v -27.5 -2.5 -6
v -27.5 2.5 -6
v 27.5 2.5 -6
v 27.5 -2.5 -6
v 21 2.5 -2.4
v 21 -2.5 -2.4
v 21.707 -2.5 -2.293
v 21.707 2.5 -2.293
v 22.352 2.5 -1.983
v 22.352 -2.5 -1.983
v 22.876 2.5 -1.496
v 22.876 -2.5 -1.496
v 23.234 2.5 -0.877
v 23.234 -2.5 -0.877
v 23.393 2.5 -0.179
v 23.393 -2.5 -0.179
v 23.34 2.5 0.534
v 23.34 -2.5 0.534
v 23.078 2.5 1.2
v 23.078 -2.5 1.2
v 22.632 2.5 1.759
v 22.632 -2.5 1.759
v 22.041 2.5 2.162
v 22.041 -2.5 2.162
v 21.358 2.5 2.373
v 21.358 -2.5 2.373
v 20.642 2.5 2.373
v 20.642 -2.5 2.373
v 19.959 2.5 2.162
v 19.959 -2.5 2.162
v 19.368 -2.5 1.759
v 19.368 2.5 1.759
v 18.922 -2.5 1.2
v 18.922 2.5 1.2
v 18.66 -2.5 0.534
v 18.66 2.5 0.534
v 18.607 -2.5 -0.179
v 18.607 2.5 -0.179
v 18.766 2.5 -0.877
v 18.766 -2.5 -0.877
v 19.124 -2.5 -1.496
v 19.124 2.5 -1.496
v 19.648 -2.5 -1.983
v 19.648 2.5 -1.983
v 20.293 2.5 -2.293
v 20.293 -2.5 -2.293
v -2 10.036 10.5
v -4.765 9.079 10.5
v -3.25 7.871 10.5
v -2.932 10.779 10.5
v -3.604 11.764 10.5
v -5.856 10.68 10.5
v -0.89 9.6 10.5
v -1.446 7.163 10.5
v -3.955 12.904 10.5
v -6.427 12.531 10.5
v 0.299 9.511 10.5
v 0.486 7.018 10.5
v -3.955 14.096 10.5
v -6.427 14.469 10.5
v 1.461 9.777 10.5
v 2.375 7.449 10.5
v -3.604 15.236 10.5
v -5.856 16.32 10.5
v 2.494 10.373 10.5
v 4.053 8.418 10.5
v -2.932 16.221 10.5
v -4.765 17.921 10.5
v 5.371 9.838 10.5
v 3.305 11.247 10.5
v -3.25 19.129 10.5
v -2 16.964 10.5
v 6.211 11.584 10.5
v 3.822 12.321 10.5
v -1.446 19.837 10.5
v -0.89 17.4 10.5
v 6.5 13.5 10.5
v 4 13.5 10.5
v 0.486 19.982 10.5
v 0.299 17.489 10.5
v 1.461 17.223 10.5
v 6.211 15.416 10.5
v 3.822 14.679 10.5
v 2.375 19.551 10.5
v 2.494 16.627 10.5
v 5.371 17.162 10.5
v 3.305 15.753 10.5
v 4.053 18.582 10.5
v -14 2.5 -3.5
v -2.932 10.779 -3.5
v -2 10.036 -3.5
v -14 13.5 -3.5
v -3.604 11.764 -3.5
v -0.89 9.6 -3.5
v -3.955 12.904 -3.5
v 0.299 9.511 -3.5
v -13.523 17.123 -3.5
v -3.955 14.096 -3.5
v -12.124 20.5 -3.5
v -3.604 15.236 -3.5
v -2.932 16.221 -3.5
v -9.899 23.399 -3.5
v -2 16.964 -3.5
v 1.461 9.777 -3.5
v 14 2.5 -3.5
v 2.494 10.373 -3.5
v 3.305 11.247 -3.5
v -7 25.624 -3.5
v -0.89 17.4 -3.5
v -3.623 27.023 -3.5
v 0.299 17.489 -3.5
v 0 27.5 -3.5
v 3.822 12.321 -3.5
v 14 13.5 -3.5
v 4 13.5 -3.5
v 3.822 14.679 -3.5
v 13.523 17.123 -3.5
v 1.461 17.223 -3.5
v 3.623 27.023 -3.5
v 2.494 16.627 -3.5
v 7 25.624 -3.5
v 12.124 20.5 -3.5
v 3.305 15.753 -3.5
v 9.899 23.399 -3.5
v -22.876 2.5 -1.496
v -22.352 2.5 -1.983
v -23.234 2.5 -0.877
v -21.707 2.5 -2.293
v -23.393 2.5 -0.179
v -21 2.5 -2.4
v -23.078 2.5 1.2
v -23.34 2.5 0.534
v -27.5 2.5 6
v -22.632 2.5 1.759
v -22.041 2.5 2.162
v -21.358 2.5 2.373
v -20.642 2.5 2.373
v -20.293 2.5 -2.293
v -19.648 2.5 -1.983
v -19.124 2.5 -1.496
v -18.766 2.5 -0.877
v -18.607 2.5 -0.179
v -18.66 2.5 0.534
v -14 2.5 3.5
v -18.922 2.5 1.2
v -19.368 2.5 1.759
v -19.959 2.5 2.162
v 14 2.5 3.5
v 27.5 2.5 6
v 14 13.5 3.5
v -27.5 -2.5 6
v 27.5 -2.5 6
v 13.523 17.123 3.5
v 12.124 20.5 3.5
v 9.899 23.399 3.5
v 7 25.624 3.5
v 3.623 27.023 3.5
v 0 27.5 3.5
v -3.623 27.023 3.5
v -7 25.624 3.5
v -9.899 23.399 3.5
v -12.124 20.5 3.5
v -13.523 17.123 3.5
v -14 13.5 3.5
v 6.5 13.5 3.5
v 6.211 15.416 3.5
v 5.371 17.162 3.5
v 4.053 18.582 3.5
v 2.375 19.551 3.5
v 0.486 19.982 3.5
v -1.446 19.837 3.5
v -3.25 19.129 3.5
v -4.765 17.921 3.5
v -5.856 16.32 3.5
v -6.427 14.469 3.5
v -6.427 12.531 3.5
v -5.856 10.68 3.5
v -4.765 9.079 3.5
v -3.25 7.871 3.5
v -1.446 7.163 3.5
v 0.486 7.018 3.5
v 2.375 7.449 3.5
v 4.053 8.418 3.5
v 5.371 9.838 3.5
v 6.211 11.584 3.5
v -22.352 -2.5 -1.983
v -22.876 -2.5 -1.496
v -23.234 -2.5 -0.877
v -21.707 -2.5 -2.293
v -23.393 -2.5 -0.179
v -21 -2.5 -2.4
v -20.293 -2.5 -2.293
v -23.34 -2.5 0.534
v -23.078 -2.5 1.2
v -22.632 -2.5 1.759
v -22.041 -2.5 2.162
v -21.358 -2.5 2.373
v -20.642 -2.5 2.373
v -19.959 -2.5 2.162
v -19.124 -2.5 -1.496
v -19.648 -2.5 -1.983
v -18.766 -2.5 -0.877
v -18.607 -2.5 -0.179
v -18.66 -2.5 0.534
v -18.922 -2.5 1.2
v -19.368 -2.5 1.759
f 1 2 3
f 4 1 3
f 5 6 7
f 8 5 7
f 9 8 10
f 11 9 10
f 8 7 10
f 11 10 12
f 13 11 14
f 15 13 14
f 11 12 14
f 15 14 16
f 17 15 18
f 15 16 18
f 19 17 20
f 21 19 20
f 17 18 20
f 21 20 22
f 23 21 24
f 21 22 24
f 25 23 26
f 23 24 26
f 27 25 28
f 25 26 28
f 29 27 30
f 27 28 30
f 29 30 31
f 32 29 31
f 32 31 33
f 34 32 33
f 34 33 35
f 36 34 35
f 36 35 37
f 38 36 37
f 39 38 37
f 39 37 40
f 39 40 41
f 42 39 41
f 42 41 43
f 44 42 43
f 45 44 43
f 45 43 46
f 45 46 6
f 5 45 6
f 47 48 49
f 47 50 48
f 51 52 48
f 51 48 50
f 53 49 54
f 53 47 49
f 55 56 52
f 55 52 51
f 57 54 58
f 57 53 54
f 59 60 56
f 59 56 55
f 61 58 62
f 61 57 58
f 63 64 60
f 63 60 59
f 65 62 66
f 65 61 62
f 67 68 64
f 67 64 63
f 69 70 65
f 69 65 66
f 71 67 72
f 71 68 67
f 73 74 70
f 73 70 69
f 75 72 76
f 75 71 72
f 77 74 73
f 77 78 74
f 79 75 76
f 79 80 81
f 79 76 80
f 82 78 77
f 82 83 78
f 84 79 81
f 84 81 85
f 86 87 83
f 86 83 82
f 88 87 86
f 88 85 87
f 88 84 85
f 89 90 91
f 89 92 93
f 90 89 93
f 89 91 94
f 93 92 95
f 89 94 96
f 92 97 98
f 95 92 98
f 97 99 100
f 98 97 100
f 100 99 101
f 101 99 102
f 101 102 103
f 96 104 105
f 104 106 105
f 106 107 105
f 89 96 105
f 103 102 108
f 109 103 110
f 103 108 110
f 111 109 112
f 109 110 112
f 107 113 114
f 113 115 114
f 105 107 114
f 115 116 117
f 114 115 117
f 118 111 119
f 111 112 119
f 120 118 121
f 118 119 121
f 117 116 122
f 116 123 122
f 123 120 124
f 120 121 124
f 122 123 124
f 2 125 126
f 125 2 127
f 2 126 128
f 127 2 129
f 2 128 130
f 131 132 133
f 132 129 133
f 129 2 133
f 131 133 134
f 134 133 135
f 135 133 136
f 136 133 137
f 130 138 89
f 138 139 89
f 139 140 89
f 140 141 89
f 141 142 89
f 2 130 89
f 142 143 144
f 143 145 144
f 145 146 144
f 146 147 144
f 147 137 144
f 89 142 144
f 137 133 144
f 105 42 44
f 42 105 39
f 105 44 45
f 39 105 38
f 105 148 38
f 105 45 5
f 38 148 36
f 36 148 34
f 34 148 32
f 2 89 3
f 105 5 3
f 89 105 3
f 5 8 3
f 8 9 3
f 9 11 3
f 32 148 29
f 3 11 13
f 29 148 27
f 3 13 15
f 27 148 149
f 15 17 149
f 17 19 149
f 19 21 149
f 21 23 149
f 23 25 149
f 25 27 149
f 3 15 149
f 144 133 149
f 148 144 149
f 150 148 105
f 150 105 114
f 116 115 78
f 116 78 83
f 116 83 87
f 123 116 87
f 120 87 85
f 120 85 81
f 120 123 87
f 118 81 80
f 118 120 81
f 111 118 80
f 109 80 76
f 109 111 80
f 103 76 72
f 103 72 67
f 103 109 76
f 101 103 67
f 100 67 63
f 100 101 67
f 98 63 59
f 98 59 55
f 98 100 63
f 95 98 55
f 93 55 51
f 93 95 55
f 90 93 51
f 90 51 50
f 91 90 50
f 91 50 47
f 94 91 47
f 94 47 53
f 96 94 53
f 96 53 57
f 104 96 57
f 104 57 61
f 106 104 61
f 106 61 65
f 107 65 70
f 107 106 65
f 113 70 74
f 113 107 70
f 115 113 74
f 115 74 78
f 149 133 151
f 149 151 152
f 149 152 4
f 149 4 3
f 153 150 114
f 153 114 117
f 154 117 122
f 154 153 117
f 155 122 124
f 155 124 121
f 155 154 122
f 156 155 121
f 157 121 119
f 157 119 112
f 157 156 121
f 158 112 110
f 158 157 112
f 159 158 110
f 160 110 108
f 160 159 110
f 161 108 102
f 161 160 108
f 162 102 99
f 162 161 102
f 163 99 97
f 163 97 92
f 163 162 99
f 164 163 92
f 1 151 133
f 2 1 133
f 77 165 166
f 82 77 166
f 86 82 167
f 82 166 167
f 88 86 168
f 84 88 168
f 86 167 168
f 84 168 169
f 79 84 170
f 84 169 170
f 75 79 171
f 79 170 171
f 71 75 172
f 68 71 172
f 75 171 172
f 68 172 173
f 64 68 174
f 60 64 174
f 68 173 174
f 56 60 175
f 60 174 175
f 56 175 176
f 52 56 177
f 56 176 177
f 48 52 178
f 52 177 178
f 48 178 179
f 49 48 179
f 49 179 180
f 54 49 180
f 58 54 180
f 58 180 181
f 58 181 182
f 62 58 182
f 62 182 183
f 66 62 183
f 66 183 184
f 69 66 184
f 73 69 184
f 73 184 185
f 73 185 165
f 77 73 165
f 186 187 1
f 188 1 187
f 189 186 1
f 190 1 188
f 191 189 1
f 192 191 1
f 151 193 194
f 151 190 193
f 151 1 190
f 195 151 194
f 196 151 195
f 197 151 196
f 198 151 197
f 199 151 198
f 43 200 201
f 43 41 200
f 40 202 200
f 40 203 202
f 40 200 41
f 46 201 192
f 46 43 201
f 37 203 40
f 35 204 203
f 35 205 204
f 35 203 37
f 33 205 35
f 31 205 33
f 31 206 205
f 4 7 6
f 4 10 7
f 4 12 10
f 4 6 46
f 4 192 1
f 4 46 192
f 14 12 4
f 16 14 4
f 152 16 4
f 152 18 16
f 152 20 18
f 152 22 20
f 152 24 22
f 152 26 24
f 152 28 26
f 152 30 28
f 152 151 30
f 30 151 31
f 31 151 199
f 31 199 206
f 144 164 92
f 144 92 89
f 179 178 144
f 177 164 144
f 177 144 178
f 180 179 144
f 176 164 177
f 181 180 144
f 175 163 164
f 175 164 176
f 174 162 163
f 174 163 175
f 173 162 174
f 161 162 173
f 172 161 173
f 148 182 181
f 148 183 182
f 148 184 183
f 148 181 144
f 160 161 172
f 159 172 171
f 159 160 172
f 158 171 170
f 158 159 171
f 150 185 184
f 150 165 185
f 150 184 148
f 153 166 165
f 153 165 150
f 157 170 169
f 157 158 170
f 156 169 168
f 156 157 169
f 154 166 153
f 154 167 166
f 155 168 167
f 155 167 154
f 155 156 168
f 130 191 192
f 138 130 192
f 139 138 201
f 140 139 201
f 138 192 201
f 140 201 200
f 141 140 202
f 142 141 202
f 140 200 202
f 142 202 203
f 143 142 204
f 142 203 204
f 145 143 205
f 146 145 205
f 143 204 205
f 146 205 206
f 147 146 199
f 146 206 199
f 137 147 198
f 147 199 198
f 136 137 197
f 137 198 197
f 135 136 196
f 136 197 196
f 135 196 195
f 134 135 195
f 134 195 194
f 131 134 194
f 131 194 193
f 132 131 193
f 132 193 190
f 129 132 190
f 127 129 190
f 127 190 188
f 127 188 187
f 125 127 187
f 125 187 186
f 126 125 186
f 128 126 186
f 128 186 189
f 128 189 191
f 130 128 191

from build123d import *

# Parameters (mm, degrees)
BOSS_EXTRUDE1_DEPTH      = 6
SKETCH1_4_R              = 6.5
BOSS_EXTRUDE2_DEPTH      = 3.5
BOSS_EXTRUDE3_DEPTH      = 10.5
BOSS_EXTRUDE3_DEPTH_BACK = 3.5
SKETCH1_5_R              = 6.5
SKETCH1_5_R_2            = 4
CUT_EXTRUDE1_REACH       = 44.03
SKETCH2_R                = 2.4


with BuildPart() as part:
    # Sketch1 → Boss-Extrude1 (new, symmetric)
    with BuildSketch(Plane.XY):
        Polygon((-14, 2.5), (-27.5, 2.5), (-27.5, -2.5), (27.5, -2.5), (27.5, 2.5), (14, 2.5), (8.660254038, 2.5), (-8.660254038, 2.5), align=None)
    extrude(amount=BOSS_EXTRUDE1_DEPTH, both=True)

    # Sketch1<4> → Boss-Extrude2 (add, symmetric)
    with BuildSketch(Plane.XY):
        with BuildLine():
            Line((-14, 13.5), (-14, 2.5))
            Line((-14, 2.5), (14, 2.5))
            Line((14, 2.5), (14, 13.5))
            ThreePointArc((14, 13.5), (0, 27.5), (-14, 13.5))
        make_face()
        with Locations((0, 13.5)):
            Circle(SKETCH1_4_R, mode=Mode.SUBTRACT)
    extrude(amount=BOSS_EXTRUDE2_DEPTH, both=True)

    # Sketch1<5> → Boss-Extrude3 (add, two sides: drawn at the far end of the back side and taken through both)
    with BuildSketch(Plane.XY.offset(-BOSS_EXTRUDE3_DEPTH_BACK)):
        with Locations((0, 13.5)):
            Circle(SKETCH1_5_R)
        with Locations((0, 13.5)):
            Circle(SKETCH1_5_R_2, mode=Mode.SUBTRACT)
    extrude(amount=BOSS_EXTRUDE3_DEPTH + BOSS_EXTRUDE3_DEPTH_BACK)

    # Sketch2 → Cut-Extrude1 (cut, up to next)
    with BuildSketch(Plane.XZ.offset(2.5), mode=Mode.PRIVATE) as cut_extrude1_sk1:
        with Locations((21, 0)):
            Circle(SKETCH2_R)
    cut_extrude1_tool1 = extrude(cut_extrude1_sk1.sketch, amount=-CUT_EXTRUDE1_REACH, mode=Mode.PRIVATE) & part.part
    # Sketch2 → Cut-Extrude1 (cut, up to next)
    with BuildSketch(Plane.XZ.offset(2.5), mode=Mode.PRIVATE) as cut_extrude1_sk2:
        with Locations((-21, 0)):
            Circle(SKETCH2_R)
    cut_extrude1_tool2 = extrude(cut_extrude1_sk2.sketch, amount=-CUT_EXTRUDE1_REACH, mode=Mode.PRIVATE) & part.part
    add(cut_extrude1_tool1.solids().sort_by_distance((21, -2.5, 0))[0], mode=Mode.SUBTRACT)
    add(cut_extrude1_tool2.solids().sort_by_distance((-21, -2.5, 0))[0], mode=Mode.SUBTRACT)


solid = part.part
